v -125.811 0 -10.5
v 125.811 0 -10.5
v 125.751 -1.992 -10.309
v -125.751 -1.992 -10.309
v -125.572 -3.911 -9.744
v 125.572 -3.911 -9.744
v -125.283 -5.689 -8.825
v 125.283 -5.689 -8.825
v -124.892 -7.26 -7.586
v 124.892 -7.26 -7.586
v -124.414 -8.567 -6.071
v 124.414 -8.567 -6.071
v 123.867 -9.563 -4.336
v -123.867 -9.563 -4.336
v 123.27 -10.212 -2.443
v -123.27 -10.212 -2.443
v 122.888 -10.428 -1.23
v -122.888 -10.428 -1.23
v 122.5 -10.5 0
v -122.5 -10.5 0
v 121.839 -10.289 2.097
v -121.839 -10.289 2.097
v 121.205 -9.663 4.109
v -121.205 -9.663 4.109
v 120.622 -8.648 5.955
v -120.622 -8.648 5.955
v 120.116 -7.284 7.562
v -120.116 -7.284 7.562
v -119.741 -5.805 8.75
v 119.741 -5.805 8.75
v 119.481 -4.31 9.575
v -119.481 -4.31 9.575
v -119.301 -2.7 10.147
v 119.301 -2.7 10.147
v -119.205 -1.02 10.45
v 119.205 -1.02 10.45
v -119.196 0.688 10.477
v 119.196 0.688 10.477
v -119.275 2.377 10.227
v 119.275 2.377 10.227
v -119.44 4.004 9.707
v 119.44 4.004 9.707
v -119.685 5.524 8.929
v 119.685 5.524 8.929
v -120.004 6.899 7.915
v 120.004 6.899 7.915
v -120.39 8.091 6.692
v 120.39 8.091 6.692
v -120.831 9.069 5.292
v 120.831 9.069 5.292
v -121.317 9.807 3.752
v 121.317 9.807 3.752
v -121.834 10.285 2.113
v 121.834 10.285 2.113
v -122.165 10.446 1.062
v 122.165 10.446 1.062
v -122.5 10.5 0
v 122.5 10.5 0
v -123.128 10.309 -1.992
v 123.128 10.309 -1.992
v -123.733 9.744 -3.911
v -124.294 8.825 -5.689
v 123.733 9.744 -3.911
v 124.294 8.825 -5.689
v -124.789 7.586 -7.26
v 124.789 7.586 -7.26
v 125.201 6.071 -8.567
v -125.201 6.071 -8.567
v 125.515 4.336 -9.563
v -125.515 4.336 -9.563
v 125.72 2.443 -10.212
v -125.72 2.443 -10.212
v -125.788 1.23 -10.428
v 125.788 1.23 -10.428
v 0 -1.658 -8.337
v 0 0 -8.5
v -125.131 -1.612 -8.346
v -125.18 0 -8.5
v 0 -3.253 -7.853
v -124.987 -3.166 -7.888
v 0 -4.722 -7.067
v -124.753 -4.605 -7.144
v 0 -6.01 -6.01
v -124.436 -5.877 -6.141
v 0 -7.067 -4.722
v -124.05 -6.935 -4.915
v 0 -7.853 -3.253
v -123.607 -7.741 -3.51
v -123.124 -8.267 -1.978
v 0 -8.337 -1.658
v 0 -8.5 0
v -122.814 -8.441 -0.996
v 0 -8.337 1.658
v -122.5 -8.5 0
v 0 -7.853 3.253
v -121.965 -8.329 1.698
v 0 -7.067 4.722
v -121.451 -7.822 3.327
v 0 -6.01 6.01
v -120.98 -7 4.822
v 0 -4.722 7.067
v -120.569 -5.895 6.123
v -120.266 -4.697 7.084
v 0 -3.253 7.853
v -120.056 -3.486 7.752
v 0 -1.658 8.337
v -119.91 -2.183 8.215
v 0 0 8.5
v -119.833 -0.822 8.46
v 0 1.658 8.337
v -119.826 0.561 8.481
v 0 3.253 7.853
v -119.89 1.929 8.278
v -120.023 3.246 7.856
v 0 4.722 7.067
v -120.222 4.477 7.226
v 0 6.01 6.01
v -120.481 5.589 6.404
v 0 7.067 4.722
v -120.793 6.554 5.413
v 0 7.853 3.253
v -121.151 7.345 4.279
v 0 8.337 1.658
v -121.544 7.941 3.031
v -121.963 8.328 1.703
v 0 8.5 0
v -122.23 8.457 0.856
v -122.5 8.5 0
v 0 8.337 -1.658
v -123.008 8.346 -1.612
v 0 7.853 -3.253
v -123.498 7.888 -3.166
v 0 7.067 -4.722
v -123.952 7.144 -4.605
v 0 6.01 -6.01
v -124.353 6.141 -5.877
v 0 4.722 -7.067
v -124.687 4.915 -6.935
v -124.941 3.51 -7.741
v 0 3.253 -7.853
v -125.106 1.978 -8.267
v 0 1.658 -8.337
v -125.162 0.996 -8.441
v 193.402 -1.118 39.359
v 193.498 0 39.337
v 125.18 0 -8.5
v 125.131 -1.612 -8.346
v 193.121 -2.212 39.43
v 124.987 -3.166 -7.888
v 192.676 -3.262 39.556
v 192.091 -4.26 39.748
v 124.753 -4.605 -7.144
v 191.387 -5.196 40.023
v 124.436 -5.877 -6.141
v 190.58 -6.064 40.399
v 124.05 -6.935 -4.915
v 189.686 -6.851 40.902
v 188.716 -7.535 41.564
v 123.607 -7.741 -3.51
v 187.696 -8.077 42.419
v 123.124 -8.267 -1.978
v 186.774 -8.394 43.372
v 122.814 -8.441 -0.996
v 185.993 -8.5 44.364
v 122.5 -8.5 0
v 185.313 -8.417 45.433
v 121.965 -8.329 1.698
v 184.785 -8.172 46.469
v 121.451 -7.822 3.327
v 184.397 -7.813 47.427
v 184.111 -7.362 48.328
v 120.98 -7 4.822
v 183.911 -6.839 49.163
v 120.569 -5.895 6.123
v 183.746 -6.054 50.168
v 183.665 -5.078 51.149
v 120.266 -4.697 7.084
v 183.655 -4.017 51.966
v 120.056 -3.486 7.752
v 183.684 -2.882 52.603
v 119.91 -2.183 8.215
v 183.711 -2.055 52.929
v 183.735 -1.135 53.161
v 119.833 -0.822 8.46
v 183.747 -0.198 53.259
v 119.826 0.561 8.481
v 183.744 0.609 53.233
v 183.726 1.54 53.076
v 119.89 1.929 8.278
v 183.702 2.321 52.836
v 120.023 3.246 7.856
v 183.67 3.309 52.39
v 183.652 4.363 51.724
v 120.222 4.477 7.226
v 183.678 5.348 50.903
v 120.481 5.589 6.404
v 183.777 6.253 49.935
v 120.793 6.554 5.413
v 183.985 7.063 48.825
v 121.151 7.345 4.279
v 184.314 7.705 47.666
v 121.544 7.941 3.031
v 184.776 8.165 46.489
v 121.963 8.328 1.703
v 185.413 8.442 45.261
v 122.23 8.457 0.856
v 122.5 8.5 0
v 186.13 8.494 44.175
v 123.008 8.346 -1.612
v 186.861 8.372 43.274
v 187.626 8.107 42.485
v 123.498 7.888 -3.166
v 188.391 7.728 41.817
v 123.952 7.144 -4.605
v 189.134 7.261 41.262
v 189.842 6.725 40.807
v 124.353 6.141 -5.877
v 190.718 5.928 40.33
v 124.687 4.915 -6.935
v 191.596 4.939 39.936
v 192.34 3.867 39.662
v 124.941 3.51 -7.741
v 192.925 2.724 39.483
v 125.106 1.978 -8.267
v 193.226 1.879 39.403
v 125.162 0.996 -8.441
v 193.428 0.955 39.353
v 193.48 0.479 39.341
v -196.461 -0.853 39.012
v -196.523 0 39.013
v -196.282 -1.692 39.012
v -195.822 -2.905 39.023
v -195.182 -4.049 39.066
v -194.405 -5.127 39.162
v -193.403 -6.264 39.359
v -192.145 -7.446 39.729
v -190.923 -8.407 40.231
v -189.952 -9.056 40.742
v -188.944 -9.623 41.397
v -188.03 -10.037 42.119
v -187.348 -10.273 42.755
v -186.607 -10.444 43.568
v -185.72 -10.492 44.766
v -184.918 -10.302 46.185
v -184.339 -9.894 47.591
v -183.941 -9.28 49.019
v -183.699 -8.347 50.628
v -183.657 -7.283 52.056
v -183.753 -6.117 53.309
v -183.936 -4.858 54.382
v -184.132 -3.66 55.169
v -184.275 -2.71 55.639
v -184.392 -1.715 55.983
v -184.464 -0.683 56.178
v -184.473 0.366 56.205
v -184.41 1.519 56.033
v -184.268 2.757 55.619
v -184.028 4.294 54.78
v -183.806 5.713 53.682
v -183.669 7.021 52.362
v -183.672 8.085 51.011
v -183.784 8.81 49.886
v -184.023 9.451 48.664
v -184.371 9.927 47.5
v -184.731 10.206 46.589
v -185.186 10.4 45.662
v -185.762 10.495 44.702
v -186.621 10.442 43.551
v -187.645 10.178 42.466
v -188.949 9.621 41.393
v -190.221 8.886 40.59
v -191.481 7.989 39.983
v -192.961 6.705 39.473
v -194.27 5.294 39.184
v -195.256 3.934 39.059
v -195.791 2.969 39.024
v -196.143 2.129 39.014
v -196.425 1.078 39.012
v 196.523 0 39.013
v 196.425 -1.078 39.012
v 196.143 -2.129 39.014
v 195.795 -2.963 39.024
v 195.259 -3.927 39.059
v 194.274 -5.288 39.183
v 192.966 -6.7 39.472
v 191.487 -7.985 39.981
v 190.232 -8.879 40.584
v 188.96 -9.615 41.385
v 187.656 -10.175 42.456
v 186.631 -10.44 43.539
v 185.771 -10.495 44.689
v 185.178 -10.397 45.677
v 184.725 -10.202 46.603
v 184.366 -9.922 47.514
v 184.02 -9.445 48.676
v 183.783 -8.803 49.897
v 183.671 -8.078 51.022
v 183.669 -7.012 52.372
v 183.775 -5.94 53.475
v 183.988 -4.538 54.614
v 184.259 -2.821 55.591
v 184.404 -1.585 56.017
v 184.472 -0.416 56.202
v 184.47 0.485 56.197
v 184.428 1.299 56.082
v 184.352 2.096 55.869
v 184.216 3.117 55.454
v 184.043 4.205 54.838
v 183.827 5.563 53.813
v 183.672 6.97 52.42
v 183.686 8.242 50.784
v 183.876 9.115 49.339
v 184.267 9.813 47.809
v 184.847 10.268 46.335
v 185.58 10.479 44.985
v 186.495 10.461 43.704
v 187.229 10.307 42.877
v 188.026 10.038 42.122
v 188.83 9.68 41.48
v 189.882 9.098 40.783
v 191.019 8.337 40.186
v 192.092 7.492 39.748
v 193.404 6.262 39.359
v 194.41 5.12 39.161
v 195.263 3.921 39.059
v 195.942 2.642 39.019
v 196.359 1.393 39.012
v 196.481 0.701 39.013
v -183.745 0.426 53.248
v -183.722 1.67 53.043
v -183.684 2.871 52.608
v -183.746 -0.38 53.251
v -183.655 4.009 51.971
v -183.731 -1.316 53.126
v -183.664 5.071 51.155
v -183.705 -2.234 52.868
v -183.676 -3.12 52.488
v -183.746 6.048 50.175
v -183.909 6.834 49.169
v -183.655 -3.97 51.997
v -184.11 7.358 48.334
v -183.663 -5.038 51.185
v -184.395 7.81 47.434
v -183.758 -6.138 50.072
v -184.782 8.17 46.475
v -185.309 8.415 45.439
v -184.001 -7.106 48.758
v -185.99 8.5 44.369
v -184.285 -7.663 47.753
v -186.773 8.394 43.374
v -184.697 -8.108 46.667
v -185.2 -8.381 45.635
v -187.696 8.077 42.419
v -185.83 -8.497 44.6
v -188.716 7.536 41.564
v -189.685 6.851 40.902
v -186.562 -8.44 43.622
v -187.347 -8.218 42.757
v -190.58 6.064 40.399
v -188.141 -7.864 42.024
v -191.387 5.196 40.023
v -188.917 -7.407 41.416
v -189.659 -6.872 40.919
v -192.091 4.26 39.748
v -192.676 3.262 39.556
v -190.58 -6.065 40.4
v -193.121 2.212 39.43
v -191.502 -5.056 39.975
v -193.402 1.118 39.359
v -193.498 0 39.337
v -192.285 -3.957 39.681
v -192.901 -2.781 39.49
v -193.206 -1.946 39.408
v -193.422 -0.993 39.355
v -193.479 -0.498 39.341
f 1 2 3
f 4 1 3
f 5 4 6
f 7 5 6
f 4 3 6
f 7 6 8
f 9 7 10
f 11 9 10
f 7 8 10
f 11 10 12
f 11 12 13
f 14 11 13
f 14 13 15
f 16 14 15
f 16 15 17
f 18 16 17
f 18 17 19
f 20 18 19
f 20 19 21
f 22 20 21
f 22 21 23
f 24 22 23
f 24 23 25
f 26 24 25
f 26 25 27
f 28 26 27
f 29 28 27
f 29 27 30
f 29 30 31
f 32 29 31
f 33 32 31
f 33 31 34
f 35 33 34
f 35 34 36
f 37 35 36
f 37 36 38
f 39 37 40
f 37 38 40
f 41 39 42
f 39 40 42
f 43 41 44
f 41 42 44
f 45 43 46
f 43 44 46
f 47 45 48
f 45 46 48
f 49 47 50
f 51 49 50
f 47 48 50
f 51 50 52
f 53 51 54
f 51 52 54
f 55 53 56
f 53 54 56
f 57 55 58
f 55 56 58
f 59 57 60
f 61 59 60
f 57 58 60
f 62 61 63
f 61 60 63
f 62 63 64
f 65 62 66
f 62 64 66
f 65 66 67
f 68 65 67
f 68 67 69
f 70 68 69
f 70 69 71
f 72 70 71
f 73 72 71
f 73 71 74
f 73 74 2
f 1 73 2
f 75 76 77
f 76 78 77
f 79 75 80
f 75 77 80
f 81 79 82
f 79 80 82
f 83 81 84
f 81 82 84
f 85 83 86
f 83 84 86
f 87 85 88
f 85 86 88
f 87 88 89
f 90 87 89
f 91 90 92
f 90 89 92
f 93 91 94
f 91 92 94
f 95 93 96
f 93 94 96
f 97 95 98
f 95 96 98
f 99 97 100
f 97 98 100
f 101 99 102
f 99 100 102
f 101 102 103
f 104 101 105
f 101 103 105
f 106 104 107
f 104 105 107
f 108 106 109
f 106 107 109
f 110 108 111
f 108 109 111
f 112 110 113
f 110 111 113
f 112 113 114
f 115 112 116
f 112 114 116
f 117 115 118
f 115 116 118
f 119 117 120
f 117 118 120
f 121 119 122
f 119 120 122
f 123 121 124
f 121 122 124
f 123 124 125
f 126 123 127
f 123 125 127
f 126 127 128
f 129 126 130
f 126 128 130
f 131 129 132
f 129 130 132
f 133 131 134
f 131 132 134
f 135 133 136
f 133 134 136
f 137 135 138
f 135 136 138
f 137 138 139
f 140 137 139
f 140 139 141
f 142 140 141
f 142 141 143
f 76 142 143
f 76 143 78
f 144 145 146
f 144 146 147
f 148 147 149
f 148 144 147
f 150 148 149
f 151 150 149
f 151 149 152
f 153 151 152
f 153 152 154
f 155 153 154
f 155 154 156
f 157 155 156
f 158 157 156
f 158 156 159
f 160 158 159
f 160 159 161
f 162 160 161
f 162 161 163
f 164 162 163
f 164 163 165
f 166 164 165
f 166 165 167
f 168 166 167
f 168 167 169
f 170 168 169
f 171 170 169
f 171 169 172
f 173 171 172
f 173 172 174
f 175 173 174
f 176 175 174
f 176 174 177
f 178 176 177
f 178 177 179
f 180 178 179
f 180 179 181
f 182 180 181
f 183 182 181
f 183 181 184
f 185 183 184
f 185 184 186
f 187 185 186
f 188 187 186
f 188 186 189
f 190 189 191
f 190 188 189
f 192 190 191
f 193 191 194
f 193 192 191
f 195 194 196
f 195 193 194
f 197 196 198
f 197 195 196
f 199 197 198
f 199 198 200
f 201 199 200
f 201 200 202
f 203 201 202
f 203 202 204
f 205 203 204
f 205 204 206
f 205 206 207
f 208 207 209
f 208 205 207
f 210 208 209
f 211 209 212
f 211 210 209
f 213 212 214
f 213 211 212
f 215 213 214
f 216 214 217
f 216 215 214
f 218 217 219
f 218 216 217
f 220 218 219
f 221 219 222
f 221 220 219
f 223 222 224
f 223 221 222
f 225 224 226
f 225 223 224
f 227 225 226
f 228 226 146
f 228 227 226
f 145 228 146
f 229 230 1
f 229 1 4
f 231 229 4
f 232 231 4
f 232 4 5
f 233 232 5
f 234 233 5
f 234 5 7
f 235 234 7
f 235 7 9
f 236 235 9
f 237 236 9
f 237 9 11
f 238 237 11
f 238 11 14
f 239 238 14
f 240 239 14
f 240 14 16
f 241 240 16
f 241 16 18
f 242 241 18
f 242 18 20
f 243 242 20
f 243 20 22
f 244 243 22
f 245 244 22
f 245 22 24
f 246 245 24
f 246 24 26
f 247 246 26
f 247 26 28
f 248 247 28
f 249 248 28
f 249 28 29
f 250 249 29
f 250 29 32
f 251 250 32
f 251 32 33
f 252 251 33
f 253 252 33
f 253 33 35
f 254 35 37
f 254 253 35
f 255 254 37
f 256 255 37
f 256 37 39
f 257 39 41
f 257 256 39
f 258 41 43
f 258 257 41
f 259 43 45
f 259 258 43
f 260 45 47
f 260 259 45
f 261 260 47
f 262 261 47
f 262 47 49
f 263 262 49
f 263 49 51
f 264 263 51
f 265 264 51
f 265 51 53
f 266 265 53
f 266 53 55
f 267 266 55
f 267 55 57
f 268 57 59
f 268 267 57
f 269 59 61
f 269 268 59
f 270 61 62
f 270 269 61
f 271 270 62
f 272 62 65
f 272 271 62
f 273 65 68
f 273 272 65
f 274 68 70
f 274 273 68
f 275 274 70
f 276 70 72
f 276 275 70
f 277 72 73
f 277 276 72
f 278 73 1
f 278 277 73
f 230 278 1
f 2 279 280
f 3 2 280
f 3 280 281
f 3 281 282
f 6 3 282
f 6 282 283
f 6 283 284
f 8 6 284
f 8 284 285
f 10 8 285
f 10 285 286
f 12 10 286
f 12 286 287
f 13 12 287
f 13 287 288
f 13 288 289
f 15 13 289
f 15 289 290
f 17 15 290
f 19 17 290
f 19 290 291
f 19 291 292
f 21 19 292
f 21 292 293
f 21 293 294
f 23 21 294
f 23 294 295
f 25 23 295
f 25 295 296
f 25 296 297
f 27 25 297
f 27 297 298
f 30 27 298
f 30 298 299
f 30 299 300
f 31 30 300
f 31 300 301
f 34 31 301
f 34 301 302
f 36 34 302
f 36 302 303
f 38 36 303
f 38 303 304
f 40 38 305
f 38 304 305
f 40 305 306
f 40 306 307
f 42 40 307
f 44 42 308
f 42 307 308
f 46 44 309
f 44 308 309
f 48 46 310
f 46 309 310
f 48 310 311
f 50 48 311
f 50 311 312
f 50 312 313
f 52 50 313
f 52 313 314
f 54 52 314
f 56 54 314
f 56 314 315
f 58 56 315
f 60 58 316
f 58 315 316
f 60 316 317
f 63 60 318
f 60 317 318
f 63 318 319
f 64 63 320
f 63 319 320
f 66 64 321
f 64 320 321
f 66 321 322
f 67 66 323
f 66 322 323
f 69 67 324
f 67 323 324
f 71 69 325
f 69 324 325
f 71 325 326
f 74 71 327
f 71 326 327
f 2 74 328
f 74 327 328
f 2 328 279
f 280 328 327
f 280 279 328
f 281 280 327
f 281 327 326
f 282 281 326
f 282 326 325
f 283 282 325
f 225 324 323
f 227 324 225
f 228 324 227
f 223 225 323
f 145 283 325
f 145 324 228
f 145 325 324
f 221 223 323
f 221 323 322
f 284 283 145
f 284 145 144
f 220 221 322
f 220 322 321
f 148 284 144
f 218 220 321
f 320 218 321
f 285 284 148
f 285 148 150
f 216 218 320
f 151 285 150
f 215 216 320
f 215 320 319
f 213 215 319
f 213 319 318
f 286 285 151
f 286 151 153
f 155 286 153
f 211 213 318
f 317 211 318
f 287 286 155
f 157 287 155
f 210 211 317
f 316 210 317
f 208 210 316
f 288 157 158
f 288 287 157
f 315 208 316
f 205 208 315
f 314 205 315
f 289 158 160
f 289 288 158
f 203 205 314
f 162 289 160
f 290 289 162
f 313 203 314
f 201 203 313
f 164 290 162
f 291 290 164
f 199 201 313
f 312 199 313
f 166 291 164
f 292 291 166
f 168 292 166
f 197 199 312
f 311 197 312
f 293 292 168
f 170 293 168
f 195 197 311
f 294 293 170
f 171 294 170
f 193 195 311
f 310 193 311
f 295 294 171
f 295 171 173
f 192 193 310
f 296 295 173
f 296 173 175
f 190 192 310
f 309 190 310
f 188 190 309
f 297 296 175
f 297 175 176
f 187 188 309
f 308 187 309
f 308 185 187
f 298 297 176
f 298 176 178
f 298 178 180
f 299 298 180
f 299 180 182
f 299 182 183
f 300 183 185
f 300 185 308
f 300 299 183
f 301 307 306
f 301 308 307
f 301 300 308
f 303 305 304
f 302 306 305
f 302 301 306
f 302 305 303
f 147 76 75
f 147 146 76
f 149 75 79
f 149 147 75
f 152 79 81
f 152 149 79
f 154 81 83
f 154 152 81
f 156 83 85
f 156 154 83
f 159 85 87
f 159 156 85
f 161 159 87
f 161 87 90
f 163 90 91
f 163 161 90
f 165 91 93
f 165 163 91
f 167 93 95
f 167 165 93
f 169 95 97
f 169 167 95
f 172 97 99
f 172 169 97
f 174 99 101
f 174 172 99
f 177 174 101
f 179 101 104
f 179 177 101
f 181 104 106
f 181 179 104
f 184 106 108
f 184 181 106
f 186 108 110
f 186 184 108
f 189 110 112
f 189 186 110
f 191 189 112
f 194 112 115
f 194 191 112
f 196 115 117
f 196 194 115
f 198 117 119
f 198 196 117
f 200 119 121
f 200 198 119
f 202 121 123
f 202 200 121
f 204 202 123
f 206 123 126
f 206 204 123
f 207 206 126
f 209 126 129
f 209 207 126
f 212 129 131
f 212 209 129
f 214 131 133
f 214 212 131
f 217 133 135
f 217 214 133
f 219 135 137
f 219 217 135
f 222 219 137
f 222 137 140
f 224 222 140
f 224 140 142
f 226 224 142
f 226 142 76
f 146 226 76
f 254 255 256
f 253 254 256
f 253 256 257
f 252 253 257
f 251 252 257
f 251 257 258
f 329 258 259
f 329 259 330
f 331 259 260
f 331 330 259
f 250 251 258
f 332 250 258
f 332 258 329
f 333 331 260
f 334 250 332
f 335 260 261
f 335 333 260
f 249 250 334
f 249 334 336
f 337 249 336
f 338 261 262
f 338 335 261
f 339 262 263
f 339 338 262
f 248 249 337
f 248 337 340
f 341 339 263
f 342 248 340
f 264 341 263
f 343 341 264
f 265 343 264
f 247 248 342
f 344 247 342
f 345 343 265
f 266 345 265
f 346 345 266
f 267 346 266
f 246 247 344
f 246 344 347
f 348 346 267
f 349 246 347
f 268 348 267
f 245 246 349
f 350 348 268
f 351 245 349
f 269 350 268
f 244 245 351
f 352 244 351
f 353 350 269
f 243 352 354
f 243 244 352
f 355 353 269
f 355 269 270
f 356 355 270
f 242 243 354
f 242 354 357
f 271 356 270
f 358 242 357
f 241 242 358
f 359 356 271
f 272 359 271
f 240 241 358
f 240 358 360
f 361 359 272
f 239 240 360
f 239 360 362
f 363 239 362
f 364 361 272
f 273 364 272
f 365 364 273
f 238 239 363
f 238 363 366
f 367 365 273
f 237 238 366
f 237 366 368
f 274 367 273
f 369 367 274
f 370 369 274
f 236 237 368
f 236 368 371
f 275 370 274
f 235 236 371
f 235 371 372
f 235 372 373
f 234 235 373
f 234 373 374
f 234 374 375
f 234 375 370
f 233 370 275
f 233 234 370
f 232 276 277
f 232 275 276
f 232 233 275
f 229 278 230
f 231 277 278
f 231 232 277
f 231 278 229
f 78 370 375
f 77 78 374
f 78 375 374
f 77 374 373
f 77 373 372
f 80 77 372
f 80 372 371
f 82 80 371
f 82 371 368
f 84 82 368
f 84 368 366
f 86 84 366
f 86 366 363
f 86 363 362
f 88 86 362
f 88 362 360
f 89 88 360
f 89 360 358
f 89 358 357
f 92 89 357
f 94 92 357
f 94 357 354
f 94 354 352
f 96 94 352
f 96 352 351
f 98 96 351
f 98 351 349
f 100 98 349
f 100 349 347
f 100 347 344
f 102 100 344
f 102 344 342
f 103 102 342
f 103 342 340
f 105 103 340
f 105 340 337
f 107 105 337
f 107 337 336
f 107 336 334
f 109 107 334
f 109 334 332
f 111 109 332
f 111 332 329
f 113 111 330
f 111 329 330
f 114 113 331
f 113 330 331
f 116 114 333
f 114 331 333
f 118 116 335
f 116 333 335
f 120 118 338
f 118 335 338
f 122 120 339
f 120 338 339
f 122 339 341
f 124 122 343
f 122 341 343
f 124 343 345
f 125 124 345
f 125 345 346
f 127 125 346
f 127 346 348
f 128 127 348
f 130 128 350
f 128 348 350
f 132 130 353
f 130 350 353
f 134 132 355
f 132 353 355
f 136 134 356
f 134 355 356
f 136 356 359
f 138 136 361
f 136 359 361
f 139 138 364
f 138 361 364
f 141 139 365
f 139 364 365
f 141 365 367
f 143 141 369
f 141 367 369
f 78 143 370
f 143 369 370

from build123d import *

# Parameters (mm, degrees)
ESBO_O2_R                  = 10.5
ESBO_O2_R_2                = 8.5
CORTE_EXTRUS_O1_DEPTH      = 205.674163986
CORTE_EXTRUS_O1_DEPTH_BACK = 205.674163986
ESBO_O3_R                  = 12.7


with BuildPart() as part:
    # Varredura1: sweep along a path in Esboço1
    with BuildLine(Plane(origin=(0, 0, 0), x_dir=(1, 0, 0), z_dir=(0, 1, 0))) as varredura1_path:
        Line((0, 0), (-122.5, 0))
        Line((-122.5, 0), (-190.5, -47.614112598))
    # Esboço2 → Varredura1 (sweep)
    with BuildSketch(Plane(origin=(0, 0, 0), x_dir=(0, 0, -1), z_dir=(1, 0, 0))):
        Circle(ESBO_O2_R)
        Circle(ESBO_O2_R_2, mode=Mode.SUBTRACT)
    varredura1 = sweep(path=varredura1_path.line, transition=Transition.RIGHT)

    # Espelhar1: Varredura1 across plane
    add(varredura1.mirror(Plane(origin=(0, 0, 0), x_dir=(0, 0, 1), z_dir=(1, 0, 0))))

    # Esboço3 → Corte-extrusão1 (cut, two sides: drawn at the far end of the back side and taken through both)
    with BuildSketch(Plane(origin=(0, 0, 0), x_dir=(1, 0, 0), z_dir=(0, 1, 0)).offset(-CORTE_EXTRUS_O1_DEPTH_BACK)):
        with Locations((196.352209331, -51.711873687)):
            Circle(ESBO_O3_R)
        with Locations((-196.352209331, -51.711873687)):
            Circle(ESBO_O3_R)
    extrude(amount=CORTE_EXTRUS_O1_DEPTH + CORTE_EXTRUS_O1_DEPTH_BACK, mode=Mode.SUBTRACT)


solid = part.part
